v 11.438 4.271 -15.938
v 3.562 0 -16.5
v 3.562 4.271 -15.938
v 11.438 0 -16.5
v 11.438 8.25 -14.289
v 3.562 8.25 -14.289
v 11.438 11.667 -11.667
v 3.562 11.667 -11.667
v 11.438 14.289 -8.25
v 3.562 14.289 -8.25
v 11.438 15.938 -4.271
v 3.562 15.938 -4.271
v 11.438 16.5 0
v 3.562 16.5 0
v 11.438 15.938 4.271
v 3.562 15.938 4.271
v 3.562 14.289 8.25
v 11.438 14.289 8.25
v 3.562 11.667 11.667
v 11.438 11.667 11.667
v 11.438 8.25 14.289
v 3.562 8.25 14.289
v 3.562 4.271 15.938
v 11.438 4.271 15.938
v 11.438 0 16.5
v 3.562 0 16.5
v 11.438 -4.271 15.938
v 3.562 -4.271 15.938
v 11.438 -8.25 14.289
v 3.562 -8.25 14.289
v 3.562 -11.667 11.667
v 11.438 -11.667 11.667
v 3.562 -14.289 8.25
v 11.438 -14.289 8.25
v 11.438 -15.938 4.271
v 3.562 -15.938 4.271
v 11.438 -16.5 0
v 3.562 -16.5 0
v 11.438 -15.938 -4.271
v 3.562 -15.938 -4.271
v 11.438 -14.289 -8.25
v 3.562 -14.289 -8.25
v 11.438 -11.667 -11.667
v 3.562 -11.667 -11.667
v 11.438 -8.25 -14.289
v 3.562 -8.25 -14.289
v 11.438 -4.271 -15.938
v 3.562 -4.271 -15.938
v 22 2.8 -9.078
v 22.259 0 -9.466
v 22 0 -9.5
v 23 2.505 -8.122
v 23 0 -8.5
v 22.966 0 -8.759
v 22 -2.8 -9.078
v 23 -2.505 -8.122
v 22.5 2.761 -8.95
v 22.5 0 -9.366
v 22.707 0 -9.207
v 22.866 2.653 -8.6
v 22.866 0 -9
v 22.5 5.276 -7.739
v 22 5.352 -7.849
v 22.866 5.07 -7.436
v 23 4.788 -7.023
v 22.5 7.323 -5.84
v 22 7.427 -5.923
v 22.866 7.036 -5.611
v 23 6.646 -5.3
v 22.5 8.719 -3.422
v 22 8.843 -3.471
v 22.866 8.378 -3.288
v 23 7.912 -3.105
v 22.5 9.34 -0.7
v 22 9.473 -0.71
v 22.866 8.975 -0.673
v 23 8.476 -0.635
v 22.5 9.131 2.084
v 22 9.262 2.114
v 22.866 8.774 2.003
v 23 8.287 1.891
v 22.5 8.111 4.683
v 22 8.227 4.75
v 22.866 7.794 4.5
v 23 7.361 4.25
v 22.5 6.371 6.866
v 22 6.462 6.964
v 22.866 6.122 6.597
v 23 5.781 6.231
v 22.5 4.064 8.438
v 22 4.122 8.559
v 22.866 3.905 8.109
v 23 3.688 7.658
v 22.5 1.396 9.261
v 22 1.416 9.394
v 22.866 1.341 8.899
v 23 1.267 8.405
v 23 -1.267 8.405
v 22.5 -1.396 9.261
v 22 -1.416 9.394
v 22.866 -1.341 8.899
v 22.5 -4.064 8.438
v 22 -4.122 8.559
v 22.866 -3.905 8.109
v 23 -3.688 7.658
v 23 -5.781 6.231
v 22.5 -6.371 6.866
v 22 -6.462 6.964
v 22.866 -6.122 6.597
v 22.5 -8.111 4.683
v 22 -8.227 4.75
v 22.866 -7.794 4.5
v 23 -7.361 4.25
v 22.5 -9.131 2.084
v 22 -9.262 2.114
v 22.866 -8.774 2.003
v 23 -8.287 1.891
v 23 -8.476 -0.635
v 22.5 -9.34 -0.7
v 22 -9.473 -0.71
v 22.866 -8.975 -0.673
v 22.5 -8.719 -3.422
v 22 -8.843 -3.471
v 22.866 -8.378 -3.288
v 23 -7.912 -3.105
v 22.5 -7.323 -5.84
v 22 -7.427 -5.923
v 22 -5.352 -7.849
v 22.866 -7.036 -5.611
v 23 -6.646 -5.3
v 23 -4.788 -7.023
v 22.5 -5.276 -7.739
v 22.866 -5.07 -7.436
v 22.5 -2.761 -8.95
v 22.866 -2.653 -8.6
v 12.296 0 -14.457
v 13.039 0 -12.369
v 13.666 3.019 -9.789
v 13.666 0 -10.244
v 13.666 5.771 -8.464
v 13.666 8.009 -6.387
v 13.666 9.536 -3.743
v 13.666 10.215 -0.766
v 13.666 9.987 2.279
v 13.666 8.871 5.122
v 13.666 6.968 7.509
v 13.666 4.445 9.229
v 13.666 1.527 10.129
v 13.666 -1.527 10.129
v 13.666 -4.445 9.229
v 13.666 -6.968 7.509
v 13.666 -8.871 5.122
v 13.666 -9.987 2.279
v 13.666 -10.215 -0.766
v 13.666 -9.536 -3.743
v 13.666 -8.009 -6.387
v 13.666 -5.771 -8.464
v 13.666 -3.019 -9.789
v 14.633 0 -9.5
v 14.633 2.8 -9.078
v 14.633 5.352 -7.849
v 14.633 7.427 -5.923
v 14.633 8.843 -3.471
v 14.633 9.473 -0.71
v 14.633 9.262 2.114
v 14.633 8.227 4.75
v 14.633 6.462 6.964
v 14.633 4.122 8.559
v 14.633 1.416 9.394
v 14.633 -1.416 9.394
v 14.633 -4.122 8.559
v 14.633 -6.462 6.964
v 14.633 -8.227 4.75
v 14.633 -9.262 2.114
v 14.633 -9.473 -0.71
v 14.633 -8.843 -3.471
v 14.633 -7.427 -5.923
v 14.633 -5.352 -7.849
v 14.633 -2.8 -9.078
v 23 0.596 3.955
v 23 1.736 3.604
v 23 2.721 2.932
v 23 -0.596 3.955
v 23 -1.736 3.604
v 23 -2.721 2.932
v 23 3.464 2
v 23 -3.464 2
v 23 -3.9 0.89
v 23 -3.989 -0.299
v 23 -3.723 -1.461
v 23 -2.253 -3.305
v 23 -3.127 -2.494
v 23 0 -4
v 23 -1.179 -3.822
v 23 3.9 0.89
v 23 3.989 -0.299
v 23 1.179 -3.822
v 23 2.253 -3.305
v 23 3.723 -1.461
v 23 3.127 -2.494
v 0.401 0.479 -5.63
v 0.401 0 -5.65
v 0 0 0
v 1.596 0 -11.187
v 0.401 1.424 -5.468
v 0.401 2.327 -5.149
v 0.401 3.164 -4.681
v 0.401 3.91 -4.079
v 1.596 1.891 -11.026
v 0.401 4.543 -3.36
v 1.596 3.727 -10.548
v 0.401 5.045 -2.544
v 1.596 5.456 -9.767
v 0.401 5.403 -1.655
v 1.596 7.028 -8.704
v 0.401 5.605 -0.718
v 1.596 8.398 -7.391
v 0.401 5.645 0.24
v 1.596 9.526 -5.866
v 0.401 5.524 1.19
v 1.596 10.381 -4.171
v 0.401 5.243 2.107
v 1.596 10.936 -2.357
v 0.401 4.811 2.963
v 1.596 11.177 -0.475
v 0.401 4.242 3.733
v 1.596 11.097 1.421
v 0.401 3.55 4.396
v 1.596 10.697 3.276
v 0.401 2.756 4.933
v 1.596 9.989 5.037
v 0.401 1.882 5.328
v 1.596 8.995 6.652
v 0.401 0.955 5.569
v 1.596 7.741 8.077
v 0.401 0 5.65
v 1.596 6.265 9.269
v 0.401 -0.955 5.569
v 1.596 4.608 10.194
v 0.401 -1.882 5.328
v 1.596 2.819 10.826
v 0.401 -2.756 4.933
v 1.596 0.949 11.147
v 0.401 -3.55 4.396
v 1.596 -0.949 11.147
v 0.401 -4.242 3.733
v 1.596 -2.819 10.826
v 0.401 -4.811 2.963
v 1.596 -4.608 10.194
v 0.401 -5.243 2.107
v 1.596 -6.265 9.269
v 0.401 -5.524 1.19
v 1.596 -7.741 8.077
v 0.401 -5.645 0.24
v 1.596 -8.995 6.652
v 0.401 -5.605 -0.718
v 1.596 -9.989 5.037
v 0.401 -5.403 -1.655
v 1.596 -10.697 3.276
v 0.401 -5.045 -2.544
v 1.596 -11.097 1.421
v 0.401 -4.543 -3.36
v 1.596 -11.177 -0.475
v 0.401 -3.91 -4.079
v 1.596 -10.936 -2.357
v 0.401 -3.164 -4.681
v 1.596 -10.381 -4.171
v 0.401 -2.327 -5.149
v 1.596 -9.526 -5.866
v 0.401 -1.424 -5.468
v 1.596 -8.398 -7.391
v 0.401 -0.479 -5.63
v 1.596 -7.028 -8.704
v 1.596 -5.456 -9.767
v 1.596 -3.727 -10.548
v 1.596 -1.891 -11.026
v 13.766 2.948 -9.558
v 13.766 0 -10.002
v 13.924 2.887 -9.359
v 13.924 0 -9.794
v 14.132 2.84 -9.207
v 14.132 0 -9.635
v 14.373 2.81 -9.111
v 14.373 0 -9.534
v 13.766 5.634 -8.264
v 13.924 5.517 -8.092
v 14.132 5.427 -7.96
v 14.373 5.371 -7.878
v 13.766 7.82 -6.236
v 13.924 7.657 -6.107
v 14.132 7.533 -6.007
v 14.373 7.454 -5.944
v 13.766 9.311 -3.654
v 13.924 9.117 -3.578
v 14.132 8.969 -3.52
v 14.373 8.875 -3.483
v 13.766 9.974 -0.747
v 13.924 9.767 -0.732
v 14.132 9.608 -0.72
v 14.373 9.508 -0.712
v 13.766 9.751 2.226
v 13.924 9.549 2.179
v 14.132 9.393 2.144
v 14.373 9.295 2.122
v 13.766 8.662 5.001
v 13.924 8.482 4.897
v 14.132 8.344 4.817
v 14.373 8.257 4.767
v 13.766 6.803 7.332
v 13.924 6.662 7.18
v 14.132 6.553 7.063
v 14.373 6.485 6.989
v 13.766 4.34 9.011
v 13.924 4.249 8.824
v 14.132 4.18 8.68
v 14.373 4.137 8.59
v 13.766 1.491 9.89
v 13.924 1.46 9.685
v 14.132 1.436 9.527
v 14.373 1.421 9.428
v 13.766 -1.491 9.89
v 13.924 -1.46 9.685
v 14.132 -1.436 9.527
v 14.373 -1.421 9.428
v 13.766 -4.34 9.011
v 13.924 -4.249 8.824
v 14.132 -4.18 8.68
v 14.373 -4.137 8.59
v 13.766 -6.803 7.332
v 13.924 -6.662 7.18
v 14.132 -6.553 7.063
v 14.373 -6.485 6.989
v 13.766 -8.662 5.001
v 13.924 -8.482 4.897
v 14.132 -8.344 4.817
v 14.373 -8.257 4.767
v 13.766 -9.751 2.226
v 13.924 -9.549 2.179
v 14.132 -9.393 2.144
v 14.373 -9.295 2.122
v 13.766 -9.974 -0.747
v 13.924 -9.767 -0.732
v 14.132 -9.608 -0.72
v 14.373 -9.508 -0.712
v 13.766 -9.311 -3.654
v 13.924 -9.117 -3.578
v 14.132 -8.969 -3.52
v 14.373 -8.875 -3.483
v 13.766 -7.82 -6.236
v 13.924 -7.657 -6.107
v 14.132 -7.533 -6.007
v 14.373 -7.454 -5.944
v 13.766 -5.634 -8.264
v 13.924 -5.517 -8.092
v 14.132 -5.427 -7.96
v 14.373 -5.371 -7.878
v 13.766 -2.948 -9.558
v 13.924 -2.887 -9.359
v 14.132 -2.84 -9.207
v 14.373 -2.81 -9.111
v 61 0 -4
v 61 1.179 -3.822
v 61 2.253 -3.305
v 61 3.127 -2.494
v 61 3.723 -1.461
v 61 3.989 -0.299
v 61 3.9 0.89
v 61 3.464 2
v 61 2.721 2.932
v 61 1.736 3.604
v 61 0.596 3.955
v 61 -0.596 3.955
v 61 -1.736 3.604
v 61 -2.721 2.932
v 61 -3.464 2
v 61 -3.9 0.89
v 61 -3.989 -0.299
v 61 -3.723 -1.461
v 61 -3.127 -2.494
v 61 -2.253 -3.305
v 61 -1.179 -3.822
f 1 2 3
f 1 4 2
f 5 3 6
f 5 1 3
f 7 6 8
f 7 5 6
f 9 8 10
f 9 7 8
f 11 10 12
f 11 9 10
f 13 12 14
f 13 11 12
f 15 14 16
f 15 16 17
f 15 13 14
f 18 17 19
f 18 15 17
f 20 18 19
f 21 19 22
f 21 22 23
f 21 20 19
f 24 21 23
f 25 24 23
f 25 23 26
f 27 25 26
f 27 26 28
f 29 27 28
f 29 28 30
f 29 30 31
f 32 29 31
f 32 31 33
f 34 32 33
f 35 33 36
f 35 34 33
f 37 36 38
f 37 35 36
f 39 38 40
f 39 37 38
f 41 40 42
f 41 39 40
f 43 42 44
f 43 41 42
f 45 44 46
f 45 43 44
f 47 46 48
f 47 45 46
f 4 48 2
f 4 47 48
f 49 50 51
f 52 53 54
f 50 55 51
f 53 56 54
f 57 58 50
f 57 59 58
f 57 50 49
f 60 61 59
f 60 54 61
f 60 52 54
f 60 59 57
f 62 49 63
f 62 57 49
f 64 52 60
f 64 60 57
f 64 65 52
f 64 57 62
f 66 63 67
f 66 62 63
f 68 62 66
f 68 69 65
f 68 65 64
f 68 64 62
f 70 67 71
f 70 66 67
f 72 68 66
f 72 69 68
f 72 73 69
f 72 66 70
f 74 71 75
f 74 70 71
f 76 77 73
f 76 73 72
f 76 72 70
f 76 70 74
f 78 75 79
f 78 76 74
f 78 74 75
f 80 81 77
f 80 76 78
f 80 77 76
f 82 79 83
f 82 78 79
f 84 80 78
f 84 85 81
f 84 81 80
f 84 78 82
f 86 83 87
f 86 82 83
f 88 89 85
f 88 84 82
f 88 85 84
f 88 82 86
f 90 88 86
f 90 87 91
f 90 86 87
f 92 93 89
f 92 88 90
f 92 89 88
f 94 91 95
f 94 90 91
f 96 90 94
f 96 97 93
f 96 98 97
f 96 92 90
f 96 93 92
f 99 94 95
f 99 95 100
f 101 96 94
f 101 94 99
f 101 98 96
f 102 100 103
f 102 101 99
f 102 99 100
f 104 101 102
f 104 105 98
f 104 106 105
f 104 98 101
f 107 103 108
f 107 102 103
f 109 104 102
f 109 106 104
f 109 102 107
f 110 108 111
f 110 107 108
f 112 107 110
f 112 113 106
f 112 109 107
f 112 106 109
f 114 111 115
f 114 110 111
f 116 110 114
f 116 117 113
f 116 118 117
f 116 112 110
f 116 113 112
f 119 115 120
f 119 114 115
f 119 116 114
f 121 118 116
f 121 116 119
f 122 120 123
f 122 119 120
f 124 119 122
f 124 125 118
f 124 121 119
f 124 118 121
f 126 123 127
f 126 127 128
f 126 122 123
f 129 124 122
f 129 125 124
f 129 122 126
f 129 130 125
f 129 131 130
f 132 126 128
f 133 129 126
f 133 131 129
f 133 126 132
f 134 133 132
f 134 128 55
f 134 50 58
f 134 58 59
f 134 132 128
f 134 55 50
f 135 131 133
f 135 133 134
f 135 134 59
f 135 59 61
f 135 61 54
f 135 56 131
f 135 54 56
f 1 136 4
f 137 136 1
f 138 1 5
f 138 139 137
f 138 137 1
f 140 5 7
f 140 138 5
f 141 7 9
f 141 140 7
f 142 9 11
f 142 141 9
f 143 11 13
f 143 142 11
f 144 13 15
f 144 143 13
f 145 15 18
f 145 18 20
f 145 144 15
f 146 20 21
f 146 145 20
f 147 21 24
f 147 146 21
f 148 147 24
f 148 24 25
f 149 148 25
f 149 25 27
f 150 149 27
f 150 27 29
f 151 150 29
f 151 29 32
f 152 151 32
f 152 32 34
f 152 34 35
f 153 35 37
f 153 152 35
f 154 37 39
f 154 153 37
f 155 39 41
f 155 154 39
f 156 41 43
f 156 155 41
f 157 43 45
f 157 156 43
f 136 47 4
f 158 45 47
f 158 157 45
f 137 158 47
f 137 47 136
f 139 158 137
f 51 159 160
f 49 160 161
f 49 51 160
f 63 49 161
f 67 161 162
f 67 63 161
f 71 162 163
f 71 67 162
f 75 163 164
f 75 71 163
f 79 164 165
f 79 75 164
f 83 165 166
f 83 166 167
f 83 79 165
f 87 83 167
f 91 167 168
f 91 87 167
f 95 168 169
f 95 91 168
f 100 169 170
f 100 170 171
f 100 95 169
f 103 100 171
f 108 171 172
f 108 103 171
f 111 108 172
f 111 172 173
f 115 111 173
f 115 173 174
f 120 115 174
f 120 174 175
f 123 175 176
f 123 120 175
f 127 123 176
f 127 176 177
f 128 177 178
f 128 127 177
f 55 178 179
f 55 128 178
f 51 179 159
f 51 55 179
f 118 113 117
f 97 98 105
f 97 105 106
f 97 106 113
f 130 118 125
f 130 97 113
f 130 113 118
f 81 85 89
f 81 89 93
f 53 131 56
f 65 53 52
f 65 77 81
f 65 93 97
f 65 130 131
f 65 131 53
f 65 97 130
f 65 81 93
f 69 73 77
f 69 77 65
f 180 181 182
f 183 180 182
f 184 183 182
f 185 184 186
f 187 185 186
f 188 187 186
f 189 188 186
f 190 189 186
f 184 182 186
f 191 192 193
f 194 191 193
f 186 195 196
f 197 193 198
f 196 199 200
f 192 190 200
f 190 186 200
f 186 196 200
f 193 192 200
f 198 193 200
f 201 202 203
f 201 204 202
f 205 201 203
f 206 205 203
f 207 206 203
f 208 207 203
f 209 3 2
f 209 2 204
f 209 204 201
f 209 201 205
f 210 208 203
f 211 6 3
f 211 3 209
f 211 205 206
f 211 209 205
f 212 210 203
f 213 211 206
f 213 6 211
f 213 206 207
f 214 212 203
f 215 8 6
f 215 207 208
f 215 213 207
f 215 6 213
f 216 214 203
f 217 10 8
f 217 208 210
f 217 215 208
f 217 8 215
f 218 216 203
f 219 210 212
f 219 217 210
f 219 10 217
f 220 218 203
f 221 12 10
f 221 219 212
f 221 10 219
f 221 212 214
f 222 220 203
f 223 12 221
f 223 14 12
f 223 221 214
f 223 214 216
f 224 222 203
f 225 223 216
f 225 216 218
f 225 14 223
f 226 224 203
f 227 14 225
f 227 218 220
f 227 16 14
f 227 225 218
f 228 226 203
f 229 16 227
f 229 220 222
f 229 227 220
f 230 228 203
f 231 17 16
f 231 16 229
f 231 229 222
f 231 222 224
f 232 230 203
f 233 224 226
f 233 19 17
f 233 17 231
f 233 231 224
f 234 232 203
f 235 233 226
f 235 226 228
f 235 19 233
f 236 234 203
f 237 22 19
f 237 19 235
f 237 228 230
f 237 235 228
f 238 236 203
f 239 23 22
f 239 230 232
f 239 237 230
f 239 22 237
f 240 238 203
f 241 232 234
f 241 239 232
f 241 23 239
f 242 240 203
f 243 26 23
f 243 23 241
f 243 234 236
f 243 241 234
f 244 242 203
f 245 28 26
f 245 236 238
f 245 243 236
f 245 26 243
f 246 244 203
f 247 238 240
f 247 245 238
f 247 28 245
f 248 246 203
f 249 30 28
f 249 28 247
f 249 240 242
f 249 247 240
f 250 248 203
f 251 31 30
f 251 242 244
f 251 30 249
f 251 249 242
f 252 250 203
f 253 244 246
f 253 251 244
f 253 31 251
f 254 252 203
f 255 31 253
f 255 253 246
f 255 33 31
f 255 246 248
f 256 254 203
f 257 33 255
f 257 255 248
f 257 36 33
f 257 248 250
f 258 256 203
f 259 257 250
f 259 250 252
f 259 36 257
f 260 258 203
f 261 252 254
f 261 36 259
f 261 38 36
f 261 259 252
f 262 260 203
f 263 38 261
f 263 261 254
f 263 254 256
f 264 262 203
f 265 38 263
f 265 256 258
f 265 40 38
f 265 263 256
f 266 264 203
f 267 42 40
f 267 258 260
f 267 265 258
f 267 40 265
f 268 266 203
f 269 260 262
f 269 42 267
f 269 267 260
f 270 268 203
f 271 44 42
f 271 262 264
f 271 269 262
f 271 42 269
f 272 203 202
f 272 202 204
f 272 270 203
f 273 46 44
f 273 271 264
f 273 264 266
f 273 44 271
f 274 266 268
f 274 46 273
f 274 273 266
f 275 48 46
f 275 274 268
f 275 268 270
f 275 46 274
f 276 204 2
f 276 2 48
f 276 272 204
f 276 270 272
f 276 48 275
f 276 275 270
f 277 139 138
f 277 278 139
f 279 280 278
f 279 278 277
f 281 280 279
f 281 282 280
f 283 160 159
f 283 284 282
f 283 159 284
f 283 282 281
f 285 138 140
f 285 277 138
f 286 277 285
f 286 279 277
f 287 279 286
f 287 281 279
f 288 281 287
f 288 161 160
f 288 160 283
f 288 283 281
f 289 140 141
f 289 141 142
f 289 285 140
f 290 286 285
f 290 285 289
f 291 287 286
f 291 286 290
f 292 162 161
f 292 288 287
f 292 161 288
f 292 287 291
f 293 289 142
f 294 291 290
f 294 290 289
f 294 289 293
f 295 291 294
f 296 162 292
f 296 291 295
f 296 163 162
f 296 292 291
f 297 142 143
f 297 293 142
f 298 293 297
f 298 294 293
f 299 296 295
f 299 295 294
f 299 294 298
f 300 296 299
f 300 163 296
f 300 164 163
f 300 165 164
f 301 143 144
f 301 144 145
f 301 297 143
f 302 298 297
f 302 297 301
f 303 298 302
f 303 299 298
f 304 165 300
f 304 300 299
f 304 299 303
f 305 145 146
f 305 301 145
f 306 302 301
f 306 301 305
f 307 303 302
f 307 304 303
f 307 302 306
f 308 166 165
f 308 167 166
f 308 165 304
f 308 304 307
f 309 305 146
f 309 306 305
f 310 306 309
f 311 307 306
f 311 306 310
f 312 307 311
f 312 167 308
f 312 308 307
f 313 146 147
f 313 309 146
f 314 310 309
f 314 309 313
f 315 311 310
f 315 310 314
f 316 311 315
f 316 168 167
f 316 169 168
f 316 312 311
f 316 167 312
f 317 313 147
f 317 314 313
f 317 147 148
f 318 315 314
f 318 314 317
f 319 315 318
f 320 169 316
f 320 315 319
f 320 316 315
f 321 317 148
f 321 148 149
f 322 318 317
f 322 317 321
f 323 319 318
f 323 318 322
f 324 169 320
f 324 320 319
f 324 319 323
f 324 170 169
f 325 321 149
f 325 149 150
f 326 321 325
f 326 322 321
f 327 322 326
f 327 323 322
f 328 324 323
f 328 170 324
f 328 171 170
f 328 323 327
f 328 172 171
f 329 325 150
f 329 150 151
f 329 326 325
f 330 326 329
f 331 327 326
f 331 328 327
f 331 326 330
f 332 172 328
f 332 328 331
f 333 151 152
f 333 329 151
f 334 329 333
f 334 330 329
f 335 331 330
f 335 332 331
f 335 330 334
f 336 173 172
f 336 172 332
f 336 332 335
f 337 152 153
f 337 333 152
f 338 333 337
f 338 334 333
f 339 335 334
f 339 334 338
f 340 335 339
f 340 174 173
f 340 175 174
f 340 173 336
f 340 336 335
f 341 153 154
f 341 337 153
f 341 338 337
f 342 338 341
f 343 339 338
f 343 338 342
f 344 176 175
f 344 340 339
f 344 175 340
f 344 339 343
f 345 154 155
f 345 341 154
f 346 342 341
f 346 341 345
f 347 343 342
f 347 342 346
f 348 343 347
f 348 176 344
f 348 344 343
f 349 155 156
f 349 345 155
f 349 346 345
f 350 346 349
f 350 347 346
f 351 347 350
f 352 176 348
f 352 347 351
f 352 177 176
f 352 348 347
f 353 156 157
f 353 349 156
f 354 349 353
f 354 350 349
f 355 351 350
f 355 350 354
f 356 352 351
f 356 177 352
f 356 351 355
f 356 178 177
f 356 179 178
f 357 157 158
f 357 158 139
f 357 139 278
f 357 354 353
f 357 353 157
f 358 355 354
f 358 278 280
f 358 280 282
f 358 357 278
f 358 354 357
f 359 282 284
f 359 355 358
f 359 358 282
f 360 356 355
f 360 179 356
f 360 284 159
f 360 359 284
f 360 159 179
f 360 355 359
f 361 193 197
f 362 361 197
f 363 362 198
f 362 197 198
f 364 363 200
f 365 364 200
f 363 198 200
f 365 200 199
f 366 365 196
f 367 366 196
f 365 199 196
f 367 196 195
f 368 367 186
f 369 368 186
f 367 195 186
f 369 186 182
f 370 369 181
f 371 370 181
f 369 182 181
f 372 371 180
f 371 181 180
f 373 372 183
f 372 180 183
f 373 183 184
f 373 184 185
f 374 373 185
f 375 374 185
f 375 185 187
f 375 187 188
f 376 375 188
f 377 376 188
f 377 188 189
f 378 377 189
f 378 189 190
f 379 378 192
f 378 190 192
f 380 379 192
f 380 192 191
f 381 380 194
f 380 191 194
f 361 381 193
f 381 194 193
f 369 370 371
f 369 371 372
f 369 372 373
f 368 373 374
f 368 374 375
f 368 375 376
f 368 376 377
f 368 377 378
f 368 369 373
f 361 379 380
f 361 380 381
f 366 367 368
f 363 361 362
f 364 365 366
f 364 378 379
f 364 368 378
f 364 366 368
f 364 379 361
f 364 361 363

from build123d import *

# Parameters (mm, degrees)
SKETCH2_R           = 4
BOSS_EXTRUDE1_DEPTH = 38


with BuildPart() as part:
    # Sketch1 → Revolve1 (revolve)
    with BuildSketch(Plane(origin=(0, 0, 0), x_dir=(1, 0, 0), z_dir=(0, 1, 0))):
        with BuildLine():
            Line((3.561695978, 16.5), (11.438304022, 16.5))
            ThreePointArc((11.438304022, 16.5), (12.682226863, 13.418262877), (13.666037589, 10.243902439))
            ThreePointArc((13.666037589, 10.243902439), (14.022810492, 9.707504713), (14.632688529, 9.5))
            Line((14.632688529, 9.5), (22, 9.5))
            ThreePointArc((22, 9.5), (22.707106781, 9.207106781), (23, 8.5))
            Line((23, 8.5), (23, 0))
            Line((23, 0), (0, 0))
            ThreePointArc((0, 0), (0.900561635, 8.440018931), (3.561695978, 16.5))
        make_face()
    revolve(axis=Axis((0, 0, 0), (1, 0, 0)))


with BuildPart() as body_2:
    # Sketch2 → Boss-Extrude1 (new body)
    with BuildSketch(Plane(origin=(23, 0, 0), x_dir=(0, 0, -1), z_dir=(1, 0, 0))):
        Circle(SKETCH2_R)
    extrude(amount=BOSS_EXTRUDE1_DEPTH)


solid = Compound([part.part, body_2.part])
